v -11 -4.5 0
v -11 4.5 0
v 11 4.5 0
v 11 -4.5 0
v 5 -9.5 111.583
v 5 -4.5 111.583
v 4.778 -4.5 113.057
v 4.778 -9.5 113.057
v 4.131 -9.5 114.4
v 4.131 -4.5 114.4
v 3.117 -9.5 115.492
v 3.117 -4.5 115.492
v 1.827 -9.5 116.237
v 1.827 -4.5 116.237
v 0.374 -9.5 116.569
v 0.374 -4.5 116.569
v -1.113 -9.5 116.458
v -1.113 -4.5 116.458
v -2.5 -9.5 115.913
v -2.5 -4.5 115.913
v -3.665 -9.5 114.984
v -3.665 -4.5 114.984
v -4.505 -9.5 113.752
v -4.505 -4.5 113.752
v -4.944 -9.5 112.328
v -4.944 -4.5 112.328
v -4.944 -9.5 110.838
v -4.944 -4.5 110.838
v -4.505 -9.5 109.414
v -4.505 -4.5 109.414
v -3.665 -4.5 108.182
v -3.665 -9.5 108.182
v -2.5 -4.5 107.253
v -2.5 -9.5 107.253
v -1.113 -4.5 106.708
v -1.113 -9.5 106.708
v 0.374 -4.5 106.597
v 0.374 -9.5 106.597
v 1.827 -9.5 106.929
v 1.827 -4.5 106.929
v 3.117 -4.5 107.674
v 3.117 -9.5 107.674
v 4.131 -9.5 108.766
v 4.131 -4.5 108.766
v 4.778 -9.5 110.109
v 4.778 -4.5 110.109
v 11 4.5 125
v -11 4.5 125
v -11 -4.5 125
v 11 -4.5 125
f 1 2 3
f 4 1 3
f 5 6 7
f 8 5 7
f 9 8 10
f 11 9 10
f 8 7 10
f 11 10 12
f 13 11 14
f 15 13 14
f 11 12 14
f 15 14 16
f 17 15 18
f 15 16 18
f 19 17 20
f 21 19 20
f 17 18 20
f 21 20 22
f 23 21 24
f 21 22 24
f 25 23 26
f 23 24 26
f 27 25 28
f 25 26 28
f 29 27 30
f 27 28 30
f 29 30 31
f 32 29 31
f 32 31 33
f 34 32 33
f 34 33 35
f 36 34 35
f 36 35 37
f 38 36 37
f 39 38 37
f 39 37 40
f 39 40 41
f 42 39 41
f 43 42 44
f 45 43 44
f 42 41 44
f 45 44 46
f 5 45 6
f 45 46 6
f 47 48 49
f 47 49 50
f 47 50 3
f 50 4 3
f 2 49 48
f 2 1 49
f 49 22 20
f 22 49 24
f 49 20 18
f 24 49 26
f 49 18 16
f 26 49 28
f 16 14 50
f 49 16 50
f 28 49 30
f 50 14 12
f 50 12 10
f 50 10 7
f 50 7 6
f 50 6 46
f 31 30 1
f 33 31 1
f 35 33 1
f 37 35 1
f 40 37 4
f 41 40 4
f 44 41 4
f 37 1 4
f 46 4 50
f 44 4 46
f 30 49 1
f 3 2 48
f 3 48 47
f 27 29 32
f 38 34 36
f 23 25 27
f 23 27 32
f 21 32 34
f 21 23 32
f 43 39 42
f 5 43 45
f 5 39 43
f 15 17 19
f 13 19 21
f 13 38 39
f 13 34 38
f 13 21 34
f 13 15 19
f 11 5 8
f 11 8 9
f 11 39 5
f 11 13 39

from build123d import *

# Parameters (mm, degrees)
F1_W      = 22
F1_H      = 9
F2_DEPTH  = 25
F2_FACE_W = 22
F2_FACE_H = 9
F3_DEPTH  = 100
F4_R      = 5
F5_DEPTH  = 5


with BuildPart() as f2:
    # F1 (on face) → F2 (new body)
    with BuildSketch(Plane.XY):
        Rectangle(F1_W, F1_H)
    extrude(amount=F2_DEPTH)

    # F2_face (on face) → F3 (join)
    with BuildSketch(Plane.XY.offset(25)):
        Rectangle(F2_FACE_W, F2_FACE_H)
    extrude(amount=F3_DEPTH)

    # F4 (on face) → F5 (join)
    with BuildSketch(Plane.XZ.offset(4.5)):
        with Locations((0, 111.583002)):
            Circle(F4_R)
    extrude(amount=F5_DEPTH)


solid = f2.part
